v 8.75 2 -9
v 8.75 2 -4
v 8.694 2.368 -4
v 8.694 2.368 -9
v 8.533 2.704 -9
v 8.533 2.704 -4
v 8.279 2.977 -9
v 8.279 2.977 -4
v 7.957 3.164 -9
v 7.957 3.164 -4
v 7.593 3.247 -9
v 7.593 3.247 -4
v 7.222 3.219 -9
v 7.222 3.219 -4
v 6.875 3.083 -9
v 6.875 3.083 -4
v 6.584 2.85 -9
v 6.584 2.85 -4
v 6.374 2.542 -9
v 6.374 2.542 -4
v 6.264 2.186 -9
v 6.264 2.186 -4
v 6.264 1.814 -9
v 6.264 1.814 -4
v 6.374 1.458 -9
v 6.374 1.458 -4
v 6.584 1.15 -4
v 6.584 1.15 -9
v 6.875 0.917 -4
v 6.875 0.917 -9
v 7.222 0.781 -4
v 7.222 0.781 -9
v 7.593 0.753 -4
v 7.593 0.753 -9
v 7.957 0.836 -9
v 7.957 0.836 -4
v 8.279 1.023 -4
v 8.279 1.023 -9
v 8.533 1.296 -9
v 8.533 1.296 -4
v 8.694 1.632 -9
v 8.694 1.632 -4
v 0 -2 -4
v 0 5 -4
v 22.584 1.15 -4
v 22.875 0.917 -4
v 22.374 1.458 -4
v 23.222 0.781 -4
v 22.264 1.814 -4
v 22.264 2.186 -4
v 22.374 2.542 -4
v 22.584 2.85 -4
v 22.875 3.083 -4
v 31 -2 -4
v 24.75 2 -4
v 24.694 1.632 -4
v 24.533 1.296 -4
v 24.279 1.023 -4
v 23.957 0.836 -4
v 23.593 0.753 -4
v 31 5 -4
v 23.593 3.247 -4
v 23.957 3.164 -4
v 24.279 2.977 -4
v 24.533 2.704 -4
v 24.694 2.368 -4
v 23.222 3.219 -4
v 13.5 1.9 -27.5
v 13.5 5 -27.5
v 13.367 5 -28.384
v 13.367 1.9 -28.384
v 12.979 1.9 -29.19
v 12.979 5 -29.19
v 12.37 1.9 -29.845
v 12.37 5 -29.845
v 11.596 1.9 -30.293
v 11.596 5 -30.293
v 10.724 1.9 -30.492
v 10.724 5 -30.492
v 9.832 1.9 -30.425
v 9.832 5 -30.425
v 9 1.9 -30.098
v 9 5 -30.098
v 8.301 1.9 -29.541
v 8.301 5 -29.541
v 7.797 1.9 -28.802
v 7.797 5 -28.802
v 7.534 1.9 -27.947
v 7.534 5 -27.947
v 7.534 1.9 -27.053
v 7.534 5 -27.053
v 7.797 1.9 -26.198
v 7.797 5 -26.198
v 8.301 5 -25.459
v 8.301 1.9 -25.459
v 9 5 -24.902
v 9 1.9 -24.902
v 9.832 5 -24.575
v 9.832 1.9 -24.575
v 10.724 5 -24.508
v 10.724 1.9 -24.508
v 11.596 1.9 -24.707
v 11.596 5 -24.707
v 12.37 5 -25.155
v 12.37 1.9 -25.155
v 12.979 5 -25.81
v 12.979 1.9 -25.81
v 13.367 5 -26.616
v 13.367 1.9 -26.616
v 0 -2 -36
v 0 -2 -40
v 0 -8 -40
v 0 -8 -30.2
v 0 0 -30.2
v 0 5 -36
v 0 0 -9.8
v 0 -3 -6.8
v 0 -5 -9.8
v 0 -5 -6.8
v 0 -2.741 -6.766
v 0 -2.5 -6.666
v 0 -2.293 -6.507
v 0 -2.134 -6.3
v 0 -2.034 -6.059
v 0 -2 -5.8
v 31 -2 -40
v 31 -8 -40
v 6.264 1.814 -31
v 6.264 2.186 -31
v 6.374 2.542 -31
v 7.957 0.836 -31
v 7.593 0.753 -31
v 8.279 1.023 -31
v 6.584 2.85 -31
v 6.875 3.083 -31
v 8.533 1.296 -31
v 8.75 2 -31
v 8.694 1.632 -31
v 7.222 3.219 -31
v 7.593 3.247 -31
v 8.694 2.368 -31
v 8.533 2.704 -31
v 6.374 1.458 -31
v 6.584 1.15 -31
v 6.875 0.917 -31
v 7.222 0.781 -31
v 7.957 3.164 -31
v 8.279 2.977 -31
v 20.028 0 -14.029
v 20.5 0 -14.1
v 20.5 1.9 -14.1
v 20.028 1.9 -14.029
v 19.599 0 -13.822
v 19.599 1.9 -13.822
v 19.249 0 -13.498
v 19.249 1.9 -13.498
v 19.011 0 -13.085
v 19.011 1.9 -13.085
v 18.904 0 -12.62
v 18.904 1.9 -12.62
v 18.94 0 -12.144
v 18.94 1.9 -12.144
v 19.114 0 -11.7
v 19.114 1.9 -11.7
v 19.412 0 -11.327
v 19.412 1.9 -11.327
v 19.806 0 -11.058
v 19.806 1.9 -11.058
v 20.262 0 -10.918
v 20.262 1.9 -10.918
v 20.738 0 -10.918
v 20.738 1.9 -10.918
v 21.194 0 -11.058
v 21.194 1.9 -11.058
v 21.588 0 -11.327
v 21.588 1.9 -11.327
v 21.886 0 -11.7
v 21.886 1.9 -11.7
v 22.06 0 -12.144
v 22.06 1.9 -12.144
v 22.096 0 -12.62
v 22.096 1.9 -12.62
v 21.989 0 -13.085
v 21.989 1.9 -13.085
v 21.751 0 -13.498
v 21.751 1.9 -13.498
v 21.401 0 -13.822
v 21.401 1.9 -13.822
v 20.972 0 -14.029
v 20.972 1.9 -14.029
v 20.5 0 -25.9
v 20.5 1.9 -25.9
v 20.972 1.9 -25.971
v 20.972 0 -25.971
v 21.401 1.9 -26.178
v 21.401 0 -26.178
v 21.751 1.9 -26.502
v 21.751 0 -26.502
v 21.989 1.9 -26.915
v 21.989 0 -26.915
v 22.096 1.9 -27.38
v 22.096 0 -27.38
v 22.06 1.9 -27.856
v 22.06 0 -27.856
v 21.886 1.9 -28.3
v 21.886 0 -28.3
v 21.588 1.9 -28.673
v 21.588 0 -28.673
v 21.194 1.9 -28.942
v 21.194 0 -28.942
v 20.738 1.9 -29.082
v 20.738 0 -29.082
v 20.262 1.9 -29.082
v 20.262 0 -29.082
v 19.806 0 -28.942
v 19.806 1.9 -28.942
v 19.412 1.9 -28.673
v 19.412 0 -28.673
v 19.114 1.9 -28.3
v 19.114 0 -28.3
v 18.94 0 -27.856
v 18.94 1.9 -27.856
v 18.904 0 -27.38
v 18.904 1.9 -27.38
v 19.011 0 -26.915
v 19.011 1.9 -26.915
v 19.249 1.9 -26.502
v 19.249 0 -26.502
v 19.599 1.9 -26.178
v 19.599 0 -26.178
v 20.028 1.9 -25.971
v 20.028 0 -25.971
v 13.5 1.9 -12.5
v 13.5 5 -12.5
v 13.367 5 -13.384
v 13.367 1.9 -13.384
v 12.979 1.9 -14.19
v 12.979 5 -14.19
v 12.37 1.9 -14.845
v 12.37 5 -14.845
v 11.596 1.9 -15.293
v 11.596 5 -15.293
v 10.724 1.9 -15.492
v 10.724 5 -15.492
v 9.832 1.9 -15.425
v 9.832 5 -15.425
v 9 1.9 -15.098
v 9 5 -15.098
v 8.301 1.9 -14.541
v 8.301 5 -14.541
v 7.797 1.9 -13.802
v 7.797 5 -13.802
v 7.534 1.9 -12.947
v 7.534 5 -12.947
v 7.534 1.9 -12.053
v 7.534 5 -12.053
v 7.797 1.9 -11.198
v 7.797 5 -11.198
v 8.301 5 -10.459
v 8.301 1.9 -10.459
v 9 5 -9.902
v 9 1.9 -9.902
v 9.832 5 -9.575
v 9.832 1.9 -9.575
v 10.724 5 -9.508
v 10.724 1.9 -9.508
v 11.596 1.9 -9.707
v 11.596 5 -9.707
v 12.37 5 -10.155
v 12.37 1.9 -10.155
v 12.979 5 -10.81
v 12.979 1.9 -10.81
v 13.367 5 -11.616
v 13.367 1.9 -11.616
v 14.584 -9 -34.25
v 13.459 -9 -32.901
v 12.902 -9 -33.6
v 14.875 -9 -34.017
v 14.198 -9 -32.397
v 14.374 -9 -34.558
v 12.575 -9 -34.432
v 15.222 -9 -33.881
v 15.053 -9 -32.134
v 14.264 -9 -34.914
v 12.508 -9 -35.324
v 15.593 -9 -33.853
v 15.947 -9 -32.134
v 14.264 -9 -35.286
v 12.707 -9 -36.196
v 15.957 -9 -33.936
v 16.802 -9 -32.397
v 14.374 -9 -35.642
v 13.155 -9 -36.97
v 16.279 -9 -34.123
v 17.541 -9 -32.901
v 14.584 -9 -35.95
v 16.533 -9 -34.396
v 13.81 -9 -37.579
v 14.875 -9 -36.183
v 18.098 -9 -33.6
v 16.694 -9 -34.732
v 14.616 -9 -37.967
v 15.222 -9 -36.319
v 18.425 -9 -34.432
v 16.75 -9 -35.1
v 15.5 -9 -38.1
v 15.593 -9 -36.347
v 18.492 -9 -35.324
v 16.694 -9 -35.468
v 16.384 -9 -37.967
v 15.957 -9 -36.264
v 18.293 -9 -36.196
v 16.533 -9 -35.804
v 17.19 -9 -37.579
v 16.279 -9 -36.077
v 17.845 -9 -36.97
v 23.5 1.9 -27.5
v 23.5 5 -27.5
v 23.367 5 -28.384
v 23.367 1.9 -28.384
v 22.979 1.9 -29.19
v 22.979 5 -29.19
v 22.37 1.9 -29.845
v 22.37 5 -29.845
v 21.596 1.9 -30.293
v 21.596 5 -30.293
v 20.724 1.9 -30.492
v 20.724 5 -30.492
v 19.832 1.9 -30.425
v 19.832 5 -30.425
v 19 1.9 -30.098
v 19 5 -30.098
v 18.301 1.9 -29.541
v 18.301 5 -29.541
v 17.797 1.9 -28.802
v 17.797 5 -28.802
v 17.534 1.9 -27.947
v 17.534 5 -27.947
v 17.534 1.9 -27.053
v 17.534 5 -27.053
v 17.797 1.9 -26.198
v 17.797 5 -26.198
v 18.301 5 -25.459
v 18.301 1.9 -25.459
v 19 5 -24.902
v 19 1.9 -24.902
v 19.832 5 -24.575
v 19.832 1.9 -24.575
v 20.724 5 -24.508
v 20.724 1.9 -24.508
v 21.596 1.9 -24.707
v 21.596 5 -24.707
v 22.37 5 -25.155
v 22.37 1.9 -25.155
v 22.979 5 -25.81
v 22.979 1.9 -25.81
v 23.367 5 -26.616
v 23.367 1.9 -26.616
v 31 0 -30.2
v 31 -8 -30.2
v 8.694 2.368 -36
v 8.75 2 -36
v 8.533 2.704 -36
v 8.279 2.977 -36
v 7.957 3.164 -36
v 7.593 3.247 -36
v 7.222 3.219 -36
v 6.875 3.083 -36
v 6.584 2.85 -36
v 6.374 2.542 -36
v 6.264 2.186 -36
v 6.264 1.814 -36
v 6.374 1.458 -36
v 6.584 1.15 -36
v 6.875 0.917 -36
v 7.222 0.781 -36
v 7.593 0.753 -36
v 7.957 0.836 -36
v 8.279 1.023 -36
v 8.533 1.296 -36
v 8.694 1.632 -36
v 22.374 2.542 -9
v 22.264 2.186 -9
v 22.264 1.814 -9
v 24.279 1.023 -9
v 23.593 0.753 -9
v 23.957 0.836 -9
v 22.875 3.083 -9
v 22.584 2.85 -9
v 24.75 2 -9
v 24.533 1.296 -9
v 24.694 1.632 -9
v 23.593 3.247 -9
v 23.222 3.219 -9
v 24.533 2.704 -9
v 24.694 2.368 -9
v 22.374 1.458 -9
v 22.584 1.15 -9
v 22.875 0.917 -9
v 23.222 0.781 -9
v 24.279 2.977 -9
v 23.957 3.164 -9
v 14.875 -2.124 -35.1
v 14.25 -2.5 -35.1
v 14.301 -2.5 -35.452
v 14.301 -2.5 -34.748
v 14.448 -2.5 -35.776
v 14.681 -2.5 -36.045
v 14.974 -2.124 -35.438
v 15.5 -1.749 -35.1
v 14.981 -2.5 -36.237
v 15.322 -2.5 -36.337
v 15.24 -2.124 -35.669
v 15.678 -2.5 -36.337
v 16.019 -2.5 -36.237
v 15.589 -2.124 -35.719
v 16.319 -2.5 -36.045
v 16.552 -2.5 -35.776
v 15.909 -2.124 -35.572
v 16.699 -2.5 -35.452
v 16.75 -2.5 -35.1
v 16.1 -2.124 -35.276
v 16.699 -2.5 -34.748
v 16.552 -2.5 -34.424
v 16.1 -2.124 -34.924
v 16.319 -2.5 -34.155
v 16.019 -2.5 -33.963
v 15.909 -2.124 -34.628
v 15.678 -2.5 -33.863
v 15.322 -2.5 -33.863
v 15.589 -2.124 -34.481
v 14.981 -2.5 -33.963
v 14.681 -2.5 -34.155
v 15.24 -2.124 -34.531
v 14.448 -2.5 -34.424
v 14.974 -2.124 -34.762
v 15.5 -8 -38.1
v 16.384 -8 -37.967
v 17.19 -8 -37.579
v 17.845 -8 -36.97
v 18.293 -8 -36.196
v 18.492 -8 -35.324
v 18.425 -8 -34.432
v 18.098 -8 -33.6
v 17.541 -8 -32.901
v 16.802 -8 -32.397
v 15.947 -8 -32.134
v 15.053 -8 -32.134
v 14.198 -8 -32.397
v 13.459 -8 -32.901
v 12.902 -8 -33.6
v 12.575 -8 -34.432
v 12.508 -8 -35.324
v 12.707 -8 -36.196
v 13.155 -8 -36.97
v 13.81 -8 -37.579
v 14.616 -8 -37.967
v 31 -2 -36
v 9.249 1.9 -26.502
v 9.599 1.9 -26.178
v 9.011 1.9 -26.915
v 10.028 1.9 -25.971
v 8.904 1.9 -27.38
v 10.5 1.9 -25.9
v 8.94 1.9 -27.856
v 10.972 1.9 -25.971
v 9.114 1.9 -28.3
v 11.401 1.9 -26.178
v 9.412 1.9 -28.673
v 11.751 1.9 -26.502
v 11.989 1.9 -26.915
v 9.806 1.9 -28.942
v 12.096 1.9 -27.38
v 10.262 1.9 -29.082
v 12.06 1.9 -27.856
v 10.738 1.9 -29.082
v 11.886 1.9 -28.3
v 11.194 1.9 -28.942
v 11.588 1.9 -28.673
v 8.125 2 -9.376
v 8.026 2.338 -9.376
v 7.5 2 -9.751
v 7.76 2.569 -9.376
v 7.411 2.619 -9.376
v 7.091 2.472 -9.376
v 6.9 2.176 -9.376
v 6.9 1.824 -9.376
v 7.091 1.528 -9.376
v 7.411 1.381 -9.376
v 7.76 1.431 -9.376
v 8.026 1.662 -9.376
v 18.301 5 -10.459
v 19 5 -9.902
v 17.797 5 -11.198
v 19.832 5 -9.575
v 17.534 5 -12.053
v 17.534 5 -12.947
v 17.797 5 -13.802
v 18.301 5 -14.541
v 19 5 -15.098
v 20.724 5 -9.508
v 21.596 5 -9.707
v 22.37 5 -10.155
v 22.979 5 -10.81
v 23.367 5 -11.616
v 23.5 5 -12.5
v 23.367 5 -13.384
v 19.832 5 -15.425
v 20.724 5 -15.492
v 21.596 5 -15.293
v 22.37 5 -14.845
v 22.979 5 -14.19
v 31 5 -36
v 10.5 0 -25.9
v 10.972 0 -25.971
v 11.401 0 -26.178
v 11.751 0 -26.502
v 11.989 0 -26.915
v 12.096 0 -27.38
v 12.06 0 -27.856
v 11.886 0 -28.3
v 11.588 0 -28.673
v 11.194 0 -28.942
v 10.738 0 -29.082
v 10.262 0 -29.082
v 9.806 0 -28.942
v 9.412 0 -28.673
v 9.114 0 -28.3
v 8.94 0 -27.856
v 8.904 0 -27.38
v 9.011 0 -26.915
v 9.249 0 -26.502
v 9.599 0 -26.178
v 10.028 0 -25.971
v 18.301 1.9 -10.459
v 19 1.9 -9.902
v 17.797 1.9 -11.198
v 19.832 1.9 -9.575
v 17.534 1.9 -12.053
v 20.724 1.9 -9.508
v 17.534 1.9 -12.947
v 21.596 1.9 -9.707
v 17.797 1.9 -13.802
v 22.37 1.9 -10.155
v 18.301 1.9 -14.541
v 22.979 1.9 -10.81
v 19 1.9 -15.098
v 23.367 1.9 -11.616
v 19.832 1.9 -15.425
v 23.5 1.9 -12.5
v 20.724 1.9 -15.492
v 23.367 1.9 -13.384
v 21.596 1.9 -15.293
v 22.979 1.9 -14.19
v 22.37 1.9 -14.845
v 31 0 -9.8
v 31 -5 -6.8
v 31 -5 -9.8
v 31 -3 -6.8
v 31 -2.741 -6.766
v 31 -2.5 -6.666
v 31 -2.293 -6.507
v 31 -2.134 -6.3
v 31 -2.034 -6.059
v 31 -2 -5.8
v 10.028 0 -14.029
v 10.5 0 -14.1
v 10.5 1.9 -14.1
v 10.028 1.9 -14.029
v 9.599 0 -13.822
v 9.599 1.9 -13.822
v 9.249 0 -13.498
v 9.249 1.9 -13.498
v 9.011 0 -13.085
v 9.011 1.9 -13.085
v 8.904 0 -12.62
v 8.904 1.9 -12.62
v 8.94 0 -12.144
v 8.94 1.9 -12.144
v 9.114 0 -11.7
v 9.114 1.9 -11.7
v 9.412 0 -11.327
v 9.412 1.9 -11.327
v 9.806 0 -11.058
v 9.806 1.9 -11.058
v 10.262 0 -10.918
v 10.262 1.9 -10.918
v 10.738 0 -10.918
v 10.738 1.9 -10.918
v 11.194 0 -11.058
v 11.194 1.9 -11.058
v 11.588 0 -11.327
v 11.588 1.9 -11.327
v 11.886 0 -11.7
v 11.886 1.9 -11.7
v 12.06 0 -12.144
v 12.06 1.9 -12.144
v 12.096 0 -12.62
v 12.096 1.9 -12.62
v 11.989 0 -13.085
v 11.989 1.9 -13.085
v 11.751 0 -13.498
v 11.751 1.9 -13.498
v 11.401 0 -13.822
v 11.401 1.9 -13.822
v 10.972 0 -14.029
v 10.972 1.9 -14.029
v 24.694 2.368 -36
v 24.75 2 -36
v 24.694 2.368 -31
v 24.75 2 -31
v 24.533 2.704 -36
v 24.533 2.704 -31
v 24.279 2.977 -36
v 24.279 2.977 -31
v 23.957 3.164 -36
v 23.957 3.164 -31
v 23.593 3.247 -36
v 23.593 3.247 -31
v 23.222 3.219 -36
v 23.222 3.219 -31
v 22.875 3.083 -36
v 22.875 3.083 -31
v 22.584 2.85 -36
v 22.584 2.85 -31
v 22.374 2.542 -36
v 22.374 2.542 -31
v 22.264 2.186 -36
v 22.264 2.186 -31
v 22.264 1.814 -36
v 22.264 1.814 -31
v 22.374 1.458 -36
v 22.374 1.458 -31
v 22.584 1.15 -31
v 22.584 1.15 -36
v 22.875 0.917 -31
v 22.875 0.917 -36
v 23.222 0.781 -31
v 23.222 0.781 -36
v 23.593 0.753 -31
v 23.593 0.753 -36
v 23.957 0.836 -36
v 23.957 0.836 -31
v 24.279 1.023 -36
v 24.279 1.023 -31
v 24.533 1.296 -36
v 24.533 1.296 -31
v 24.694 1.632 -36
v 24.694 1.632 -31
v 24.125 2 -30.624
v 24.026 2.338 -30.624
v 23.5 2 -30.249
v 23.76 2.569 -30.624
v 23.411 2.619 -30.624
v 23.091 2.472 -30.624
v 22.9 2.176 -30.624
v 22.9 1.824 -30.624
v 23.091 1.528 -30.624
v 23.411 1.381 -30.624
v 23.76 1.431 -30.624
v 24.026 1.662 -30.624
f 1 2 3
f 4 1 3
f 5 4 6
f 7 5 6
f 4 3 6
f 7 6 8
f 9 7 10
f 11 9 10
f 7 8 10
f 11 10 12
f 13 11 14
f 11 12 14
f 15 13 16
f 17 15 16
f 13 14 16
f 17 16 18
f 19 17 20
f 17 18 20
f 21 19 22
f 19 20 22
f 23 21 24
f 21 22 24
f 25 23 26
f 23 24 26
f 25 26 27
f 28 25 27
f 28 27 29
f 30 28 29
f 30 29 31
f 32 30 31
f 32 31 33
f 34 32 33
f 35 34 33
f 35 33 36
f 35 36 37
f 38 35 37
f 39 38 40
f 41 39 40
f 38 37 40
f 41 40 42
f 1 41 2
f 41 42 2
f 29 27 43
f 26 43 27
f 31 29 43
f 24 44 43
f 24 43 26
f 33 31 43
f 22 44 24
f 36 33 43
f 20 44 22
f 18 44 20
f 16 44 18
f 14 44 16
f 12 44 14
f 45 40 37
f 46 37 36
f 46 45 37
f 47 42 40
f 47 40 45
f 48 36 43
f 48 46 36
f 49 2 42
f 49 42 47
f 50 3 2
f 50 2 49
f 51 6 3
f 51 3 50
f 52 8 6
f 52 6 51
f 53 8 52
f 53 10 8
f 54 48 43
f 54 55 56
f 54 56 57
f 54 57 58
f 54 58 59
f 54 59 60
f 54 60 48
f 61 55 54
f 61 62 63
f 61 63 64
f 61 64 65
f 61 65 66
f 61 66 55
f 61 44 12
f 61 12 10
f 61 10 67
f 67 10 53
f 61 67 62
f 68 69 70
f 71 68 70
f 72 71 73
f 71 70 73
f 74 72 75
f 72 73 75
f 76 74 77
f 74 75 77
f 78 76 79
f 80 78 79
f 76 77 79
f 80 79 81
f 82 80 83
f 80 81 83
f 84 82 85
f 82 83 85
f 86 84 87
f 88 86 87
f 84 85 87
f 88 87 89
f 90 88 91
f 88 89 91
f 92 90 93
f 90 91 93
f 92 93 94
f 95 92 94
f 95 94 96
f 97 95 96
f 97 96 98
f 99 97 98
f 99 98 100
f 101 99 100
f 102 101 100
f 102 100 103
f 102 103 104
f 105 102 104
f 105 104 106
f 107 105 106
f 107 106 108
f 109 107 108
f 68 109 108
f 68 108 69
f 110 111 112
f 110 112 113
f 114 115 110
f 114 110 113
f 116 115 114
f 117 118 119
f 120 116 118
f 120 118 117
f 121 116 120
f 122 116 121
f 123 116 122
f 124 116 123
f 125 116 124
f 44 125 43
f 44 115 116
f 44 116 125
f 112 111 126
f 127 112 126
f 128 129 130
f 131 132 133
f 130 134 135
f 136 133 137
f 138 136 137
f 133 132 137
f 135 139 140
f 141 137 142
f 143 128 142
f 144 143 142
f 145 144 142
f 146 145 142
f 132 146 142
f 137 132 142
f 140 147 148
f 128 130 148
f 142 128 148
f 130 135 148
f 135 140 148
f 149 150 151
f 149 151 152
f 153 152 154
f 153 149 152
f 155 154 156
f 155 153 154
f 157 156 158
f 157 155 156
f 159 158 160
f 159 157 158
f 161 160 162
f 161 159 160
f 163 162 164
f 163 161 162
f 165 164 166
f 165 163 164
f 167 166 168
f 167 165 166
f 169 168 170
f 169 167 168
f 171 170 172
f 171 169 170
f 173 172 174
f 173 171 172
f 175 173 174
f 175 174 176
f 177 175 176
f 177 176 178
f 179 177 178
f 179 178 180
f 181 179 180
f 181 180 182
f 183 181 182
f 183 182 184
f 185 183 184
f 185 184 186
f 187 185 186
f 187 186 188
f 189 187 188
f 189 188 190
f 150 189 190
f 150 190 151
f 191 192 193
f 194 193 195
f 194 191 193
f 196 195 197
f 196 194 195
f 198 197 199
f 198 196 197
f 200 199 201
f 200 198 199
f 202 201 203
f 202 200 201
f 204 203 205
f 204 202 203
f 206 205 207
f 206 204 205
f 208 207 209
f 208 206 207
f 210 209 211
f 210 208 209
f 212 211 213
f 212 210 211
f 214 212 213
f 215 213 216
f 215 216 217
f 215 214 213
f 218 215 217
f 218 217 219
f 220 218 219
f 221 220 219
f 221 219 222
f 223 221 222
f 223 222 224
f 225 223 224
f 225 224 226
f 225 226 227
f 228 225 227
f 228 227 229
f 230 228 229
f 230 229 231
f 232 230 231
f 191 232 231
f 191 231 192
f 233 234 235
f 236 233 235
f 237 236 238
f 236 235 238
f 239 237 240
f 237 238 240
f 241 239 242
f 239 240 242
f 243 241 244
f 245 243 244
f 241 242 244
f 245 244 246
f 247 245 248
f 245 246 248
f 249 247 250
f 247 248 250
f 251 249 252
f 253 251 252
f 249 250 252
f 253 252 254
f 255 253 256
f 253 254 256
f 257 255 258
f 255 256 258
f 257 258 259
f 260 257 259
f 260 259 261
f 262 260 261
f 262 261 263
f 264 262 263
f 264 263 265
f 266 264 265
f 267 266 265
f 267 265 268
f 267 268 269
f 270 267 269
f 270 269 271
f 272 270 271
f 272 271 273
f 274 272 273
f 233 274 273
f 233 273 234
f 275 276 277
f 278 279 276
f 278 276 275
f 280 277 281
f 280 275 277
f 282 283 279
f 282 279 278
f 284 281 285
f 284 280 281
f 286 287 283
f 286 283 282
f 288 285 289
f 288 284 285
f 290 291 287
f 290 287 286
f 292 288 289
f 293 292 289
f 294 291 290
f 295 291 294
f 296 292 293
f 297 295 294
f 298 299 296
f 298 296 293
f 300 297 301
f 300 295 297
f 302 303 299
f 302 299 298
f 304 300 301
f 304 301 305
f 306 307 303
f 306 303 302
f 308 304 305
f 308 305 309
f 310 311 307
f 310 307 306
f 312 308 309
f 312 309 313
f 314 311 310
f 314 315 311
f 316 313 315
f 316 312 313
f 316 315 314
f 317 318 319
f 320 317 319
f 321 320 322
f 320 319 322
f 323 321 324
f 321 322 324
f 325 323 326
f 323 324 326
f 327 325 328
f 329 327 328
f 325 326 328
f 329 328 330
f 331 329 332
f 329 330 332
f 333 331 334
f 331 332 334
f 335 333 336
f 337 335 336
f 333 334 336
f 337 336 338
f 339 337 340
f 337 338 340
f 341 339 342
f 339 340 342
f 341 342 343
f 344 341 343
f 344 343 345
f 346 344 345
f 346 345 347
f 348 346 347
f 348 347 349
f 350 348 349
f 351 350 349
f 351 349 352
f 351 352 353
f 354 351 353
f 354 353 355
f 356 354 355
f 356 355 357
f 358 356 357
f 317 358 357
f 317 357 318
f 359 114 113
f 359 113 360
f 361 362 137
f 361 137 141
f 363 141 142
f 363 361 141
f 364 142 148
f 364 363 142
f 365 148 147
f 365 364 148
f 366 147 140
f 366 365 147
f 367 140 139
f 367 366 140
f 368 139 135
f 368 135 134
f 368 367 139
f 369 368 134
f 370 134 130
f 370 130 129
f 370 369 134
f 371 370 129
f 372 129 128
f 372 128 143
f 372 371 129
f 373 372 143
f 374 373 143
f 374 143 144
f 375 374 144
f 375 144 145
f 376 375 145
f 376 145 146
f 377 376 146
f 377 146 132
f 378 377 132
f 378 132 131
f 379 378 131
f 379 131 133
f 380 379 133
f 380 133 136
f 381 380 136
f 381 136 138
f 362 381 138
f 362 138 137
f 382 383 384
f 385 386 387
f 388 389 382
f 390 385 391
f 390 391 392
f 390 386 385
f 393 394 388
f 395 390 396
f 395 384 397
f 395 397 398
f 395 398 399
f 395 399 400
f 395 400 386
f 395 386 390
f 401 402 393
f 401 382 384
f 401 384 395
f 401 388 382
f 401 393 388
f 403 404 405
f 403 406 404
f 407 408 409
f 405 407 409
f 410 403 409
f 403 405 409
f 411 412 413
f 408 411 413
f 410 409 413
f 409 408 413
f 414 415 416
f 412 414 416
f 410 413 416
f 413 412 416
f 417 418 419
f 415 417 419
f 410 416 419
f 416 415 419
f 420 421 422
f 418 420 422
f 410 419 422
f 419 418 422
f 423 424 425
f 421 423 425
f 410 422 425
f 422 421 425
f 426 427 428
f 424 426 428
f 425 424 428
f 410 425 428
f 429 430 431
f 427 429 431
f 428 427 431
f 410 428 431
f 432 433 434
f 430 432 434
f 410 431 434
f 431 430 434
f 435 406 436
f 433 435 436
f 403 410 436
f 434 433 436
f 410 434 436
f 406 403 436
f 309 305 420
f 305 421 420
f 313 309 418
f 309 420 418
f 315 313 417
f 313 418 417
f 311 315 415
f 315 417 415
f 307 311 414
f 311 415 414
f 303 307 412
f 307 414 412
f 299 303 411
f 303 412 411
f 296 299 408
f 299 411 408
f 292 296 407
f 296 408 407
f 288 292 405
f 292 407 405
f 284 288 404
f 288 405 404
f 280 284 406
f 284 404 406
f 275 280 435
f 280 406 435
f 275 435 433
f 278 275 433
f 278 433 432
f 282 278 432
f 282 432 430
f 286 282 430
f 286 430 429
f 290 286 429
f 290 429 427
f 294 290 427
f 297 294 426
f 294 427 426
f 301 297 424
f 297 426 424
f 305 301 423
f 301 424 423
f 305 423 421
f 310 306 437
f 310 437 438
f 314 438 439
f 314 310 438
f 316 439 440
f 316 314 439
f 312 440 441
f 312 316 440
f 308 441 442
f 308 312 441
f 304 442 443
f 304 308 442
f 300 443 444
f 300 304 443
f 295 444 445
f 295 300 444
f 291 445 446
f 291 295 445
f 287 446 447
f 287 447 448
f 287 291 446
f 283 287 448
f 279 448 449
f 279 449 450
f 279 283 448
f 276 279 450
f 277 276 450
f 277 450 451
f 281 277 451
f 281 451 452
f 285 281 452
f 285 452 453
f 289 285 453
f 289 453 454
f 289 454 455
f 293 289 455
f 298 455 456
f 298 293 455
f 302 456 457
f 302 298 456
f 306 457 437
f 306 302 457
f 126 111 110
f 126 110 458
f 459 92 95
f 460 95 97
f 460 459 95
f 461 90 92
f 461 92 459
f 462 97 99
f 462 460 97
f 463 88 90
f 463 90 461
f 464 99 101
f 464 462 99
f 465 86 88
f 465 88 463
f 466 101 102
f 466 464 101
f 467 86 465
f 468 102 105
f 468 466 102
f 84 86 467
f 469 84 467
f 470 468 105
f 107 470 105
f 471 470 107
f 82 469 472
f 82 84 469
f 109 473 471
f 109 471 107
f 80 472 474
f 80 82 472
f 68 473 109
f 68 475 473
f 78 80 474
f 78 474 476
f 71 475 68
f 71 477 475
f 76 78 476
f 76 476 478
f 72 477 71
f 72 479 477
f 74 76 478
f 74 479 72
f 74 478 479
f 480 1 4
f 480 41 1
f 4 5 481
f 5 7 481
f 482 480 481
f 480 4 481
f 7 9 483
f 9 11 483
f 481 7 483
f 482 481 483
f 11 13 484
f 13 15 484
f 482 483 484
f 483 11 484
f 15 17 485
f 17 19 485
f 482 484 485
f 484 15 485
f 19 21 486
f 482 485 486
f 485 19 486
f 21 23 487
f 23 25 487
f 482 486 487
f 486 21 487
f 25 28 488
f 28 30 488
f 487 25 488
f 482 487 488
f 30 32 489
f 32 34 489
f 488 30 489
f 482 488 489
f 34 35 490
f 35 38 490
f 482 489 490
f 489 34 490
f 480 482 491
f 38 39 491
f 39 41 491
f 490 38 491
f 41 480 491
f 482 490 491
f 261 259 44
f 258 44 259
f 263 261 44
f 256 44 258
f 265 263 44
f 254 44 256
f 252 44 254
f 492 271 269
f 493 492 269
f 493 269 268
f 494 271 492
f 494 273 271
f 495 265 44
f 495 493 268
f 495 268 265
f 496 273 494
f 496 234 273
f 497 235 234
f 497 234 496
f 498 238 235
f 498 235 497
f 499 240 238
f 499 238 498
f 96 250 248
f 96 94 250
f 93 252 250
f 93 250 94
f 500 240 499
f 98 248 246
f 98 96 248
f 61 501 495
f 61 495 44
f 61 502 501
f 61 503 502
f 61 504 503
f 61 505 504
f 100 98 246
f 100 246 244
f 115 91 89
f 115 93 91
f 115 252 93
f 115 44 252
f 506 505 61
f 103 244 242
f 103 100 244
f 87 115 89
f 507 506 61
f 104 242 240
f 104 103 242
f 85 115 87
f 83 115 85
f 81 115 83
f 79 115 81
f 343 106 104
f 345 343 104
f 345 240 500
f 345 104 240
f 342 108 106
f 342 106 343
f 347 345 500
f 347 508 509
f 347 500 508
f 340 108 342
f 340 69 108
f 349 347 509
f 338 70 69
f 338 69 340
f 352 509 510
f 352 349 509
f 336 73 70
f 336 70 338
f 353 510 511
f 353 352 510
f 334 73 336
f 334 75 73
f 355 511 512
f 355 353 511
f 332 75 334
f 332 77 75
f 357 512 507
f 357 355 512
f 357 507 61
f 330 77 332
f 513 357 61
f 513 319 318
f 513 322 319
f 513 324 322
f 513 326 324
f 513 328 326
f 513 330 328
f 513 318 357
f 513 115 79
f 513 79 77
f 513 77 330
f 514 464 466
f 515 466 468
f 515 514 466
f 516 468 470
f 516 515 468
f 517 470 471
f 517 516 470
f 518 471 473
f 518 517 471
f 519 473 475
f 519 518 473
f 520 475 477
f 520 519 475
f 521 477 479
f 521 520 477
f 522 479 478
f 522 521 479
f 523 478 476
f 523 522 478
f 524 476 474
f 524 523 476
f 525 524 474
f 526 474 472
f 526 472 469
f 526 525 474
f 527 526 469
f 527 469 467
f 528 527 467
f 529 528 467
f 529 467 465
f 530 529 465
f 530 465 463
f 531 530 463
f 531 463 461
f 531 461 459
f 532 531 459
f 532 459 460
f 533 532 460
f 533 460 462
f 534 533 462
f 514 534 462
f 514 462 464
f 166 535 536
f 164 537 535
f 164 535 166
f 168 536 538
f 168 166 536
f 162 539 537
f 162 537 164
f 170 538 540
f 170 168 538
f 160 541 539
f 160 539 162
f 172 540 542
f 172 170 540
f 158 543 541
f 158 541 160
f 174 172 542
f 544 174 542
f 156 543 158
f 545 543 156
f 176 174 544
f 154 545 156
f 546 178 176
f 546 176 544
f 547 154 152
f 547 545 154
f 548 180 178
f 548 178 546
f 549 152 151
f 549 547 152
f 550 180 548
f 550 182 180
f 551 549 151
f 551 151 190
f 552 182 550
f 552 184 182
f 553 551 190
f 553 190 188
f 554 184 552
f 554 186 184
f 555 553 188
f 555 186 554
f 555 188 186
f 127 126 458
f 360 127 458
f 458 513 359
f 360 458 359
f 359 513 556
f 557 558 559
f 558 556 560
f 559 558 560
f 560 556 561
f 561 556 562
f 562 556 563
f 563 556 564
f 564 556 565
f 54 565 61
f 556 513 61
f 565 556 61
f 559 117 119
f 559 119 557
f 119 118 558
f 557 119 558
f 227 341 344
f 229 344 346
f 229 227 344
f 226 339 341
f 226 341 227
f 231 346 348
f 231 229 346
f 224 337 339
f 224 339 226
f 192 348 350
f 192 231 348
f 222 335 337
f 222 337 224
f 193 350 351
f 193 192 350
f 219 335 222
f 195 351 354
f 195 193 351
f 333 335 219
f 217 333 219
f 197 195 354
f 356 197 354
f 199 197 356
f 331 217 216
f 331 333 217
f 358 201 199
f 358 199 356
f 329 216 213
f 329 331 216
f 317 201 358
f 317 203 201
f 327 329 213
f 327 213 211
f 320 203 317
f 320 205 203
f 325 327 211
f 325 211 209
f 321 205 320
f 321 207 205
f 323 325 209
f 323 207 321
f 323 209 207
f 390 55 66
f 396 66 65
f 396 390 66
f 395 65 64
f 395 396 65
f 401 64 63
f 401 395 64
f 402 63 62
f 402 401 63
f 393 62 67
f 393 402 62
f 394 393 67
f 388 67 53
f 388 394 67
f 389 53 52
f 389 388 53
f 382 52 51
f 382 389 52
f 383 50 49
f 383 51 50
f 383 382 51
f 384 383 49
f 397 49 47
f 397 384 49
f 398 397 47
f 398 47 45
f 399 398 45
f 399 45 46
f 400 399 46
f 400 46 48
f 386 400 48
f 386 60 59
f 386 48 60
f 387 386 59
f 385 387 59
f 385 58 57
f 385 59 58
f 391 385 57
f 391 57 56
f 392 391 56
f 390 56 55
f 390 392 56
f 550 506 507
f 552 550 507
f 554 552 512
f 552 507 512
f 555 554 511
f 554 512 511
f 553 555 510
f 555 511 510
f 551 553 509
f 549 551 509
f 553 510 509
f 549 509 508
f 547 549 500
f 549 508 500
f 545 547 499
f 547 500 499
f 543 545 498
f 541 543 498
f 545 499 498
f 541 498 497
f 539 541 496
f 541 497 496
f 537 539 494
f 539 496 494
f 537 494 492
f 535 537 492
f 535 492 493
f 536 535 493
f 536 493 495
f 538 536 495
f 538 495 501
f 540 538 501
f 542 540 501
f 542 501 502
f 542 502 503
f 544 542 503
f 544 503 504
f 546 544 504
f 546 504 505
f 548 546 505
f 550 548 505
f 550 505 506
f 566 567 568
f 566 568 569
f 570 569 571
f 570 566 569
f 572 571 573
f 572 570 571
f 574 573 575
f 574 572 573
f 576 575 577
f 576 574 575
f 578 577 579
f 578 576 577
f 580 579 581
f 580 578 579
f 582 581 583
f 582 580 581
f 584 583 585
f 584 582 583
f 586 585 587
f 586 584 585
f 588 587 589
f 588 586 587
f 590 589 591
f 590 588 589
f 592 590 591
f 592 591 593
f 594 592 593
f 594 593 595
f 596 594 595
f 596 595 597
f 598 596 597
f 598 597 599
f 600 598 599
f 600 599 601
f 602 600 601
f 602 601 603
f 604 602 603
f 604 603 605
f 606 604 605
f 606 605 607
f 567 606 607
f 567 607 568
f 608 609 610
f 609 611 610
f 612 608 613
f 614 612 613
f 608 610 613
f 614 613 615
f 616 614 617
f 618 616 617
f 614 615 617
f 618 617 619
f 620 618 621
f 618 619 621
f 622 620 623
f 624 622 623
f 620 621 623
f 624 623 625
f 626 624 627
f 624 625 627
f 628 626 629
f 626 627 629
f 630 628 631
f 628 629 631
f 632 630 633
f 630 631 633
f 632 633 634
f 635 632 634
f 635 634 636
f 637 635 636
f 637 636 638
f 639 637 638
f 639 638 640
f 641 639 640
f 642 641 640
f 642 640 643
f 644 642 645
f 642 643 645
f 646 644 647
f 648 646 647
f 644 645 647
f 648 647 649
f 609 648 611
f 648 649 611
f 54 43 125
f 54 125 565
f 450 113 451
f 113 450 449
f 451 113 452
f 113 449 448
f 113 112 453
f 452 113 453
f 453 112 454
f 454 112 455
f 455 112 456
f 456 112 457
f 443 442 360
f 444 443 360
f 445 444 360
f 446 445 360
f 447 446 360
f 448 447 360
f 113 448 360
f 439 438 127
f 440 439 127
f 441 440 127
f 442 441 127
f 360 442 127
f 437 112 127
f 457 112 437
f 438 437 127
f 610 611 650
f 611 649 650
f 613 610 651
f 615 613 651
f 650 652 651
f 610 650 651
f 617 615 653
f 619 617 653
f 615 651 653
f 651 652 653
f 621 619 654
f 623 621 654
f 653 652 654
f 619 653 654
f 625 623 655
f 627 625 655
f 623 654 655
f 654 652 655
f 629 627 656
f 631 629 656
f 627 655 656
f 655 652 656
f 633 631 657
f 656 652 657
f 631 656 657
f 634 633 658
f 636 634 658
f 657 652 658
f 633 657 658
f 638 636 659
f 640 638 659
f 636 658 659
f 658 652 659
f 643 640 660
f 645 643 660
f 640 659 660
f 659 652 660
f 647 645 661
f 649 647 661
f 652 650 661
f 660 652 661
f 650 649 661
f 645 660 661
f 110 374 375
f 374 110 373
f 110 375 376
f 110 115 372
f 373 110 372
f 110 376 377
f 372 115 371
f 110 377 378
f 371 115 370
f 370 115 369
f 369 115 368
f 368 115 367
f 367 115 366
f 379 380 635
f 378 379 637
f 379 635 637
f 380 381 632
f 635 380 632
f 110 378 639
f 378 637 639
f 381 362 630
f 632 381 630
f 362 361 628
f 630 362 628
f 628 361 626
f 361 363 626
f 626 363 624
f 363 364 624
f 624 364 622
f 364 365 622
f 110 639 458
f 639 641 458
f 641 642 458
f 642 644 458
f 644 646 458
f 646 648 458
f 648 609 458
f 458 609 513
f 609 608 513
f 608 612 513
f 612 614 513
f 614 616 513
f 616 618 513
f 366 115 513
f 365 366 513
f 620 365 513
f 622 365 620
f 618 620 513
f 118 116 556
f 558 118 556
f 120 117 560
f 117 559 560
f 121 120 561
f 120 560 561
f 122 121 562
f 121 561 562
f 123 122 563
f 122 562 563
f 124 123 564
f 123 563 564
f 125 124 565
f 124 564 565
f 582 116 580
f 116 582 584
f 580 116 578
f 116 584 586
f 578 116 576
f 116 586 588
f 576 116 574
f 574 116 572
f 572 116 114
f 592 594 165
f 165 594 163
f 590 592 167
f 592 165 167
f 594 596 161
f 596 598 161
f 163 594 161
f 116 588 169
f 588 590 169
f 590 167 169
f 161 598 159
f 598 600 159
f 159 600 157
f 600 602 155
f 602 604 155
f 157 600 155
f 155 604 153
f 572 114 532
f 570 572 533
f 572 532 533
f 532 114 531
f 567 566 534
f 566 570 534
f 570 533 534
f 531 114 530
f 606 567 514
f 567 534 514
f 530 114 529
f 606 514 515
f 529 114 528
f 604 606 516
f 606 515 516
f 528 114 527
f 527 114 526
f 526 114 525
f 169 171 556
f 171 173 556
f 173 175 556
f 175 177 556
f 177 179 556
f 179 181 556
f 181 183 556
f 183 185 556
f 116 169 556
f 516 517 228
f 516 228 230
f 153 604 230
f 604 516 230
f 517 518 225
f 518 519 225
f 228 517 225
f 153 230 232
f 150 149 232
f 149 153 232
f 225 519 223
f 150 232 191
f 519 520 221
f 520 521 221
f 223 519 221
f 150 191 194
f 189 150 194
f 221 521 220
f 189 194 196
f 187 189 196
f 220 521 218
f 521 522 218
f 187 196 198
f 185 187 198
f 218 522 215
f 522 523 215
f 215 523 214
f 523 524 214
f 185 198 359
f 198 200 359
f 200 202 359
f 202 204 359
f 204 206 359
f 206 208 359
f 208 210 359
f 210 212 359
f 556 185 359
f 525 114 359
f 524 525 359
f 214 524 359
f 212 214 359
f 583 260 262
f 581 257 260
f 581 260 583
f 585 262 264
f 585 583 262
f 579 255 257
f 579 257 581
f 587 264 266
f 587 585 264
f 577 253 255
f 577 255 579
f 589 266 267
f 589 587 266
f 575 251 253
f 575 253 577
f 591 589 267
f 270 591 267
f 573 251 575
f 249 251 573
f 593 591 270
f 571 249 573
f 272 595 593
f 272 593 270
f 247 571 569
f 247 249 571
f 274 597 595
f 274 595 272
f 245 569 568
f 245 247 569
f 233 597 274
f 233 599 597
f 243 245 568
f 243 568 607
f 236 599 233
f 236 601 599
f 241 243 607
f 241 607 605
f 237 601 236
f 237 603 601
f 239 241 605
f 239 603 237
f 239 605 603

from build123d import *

# Parameters (mm, degrees)
SKETCH_1_W                     = 31
SKETCH_1_H                     = 40
SKETCH_1_R                     = 1.6
EXTRUDE_1_DEPTH                = 5
SKETCH_2_W                     = 31
SKETCH_2_H                     = 9.8
EXTRUDE_3_DEPTH                = 8
SKETCH_13_R                    = 1
CUT_EXTRUDE_7_DEPTH            = 5
EXTRUDE_START                  = 1
SKETCH_14_R                    = 3
SKETCH_14_R_2                  = 1
EXTRUDE_8_DEPTH                = 1
HOLE_WIZARD_M3_3_D             = 2.5
HOLE_WIZARD_M3_3_DEPTH         = 6.5
HOLE_WIZARD_M3_3_TIP           = 0.751075774
SKETCH_18_W                    = 31
SKETCH_18_H                    = 3
EXTRUDE_9_DEPTH                = 10
SKETCH_29_W                    = 31
SKETCH_29_H                    = 6.8
EXTRUDE_11_DEPTH               = 2
SKETCH_20_R                    = 1
CUT_EXTRUDE_9_DEPTH            = 9
HOLE_START                     = -9
HOLE_WIZARD_M3_1_OUTLINE_R     = 1.25
HOLE_WIZARD_M3_1_OUTLINE_R_2   = 1
HOLE_WIZARD_M3_1_DEPTH         = 9
HOLE_WIZARD_M3_1_3_D           = 3.2
HOLE_WIZARD_M3_1_3_CBORE_D     = 6
HOLE_WIZARD_M3_1_3_CBORE_DEPTH = 3.1
HOLE_START_2                   = -40
HOLE_WIZARD_M3_2_OUTLINE_R     = 1.25
HOLE_WIZARD_M3_2_OUTLINE_R_2   = 1
HOLE_WIZARD_M3_2_DEPTH         = 9
FILLET_2_R                     = 1
SKETCH_30_W                    = 31
SKETCH_30_H                    = 7
CUT_EXTRUDE_10_DEPTH           = 4


# Read off the part's stored shape, not the designer's step: M3 螺纹孔1, M3 螺纹孔2
with BuildPart() as part:
    # 草图1 → 凸台-拉伸1 (new body)
    with BuildSketch(Plane(origin=(0, 0, 0), x_dir=(1, 0, 0), z_dir=(0, 1, 0))):
        with Locations((15.5, 20)):
            Rectangle(SKETCH_1_W, SKETCH_1_H)
        with Locations(Location((20.5, 27.5, 0), (0, 0, 270))):
            Circle(SKETCH_1_R, mode=Mode.SUBTRACT)
        with Locations(Location((10.5, 27.5, 0), (0, 0, 270))):
            Circle(SKETCH_1_R, mode=Mode.SUBTRACT)
        with Locations(Location((10.5, 12.5, 0), (0, 0, 90))):
            Circle(SKETCH_1_R, mode=Mode.SUBTRACT)
        with Locations(Location((20.5, 12.5, 0), (0, 0, 90))):
            Circle(SKETCH_1_R, mode=Mode.SUBTRACT)
    extrude(amount=EXTRUDE_1_DEPTH)

    # 草图2 → 凸台-拉伸3 (add)
    with BuildSketch(Plane(origin=(0, 0, 0), x_dir=(1, 0, 0), z_dir=(0, 1, 0))):
        with Locations((15.5, 35.1)):
            Rectangle(SKETCH_2_W, SKETCH_2_H)
    extrude(amount=-EXTRUDE_3_DEPTH)

    # 草图13 → 切除-拉伸7 (cut)
    with BuildSketch(Plane.XZ.offset(8)):
        with Locations(Location((15.5, -35.1, 0), (0, 0, 270))):
            Circle(SKETCH_13_R)
    extrude(amount=-CUT_EXTRUDE_7_DEPTH, mode=Mode.SUBTRACT)

    # 草图14 → 凸台-拉伸8 (add)
    with BuildSketch(Plane.XZ.offset(8).offset(EXTRUDE_START)):
        with Locations(Location((15.5, -35.1, 0), (0, 0, 270))):
            Circle(SKETCH_14_R)
        with Locations(Location((15.5, -35.1, 0), (0, 0, 270))):
            Circle(SKETCH_14_R_2, mode=Mode.SUBTRACT)
    extrude(amount=-EXTRUDE_8_DEPTH)

    # M3 螺纹孔3
    with Locations(Plane(origin=(0, -9, 0), x_dir=(-1, 0, 0), z_dir=(0, -1, 0))):
        with Locations((-15.5, 35.1)):
            Hole(HOLE_WIZARD_M3_3_D / 2, depth=HOLE_WIZARD_M3_3_DEPTH)
            with Locations((0, 0, -(HOLE_WIZARD_M3_3_DEPTH + HOLE_WIZARD_M3_3_TIP / 2))):  # 118° drill point
                Cone(0, HOLE_WIZARD_M3_3_D / 2, HOLE_WIZARD_M3_3_TIP, mode=Mode.SUBTRACT)

    # 草图18 → 凸台-拉伸9 (add)
    with BuildSketch(Plane(origin=(0, 5, 0), x_dir=(1, 0, 0), z_dir=(0, 1, 0))):
        with Locations((15.5, 8.3)):
            Rectangle(SKETCH_18_W, SKETCH_18_H)
    extrude(amount=-EXTRUDE_9_DEPTH)

    # 草图29 → 凸台-拉伸11 (add)
    with BuildSketch(Plane.XZ):
        with Locations((15.5, -3.4)):
            Rectangle(SKETCH_29_W, SKETCH_29_H)
    extrude(amount=EXTRUDE_11_DEPTH)

    # 草图20 → 切除-拉伸9 (cut)
    with BuildSketch(Plane.XY):
        with Locations((7.5, 2)):
            Circle(SKETCH_20_R)
        with Locations(Location((23.5, 2, 0), (0, 0, 180))):
            Circle(SKETCH_20_R)
    cut_extrude_9 = extrude(amount=-CUT_EXTRUDE_9_DEPTH, mode=Mode.SUBTRACT)

    # Hole Wizard M3 _1 outline → Hole Wizard M3 _1 (cut)
    with BuildSketch(Plane.XY.offset(HOLE_START)):
        with Locations((23.5, 2)):
            Circle(HOLE_WIZARD_M3_1_OUTLINE_R)
        with Locations((23.5, 2)):
            Circle(HOLE_WIZARD_M3_1_OUTLINE_R_2, mode=Mode.SUBTRACT)
    extrude(amount=HOLE_WIZARD_M3_1_DEPTH, mode=Mode.SUBTRACT)

    # Hole Wizard M3 _1 2 outline → Hole Wizard M3 _1 2 (revolve, cut)
    with BuildSketch(Plane(origin=(7.5, 2, 0), x_dir=(1, 0, 0), z_dir=(0, -1, 0))):
        Polygon((0, -9), (0, -9.751075774), (1.25, -9), (1.25, 0), (1, 0), (1, -9), align=None)
    revolve(axis=Axis((7.5, 2, 0), (0, 0, 1)), mode=Mode.SUBTRACT)

    # 镜向1: 切除-拉伸9 across plane
    add(cut_extrude_9.mirror(Plane.XY.offset(-20)), mode=Mode.SUBTRACT)

    # Hole Wizard M3 _1 3 (through all)
    with Locations(Plane(origin=(0, 5, 0), x_dir=(1, 0, 0), z_dir=(0, 1, 0))):
        with Locations((10.5, 27.5), (10.5, 12.5), (20.5, 12.5), (20.5, 27.5)):
            CounterBoreHole(HOLE_WIZARD_M3_1_3_D / 2, HOLE_WIZARD_M3_1_3_CBORE_D / 2, HOLE_WIZARD_M3_1_3_CBORE_DEPTH)

    # M3 螺纹孔2 outline → M3 螺纹孔2 (cut)
    with BuildSketch(Plane.XY.offset(HOLE_START_2)):
        with Locations((7.5, 2)):
            Circle(HOLE_WIZARD_M3_2_OUTLINE_R)
        with Locations((7.5, 2)):
            Circle(HOLE_WIZARD_M3_2_OUTLINE_R_2, mode=Mode.SUBTRACT)
    extrude(amount=HOLE_WIZARD_M3_2_DEPTH, mode=Mode.SUBTRACT)

    # Hole Wizard M3 _2 2 outline → Hole Wizard M3 _2 2 (revolve, cut)
    with BuildSketch(Plane(origin=(23.5, 2, 0), x_dir=(1, 0, 0), z_dir=(0, -1, 0))):
        Polygon((1.25, -31), (0, -30.248924226), (0, -31), (1, -31), (1, -40), (1.25, -40), align=None)
    revolve(axis=Axis((23.5, 2, 0), (0, 0, 1)), mode=Mode.SUBTRACT)

    # 圆角2
    fillet_2_edges = [part.edges().sort_by_distance(p)[0] for p in [
        (15.5, -2, -6.8),
    ]]
    fillet(fillet_2_edges, radius=FILLET_2_R)

    # 草图30 → 切除-拉伸10 (cut)
    with BuildSketch(Plane.XY):
        with Locations((15.5, 1.5)):
            Rectangle(SKETCH_30_W, SKETCH_30_H)
    cut_extrude_10 = extrude(amount=-CUT_EXTRUDE_10_DEPTH, mode=Mode.SUBTRACT)

    # 镜向3: 切除-拉伸10 across plane
    add(cut_extrude_10.mirror(Plane.XY.offset(-20)), mode=Mode.SUBTRACT)


solid = part.part
